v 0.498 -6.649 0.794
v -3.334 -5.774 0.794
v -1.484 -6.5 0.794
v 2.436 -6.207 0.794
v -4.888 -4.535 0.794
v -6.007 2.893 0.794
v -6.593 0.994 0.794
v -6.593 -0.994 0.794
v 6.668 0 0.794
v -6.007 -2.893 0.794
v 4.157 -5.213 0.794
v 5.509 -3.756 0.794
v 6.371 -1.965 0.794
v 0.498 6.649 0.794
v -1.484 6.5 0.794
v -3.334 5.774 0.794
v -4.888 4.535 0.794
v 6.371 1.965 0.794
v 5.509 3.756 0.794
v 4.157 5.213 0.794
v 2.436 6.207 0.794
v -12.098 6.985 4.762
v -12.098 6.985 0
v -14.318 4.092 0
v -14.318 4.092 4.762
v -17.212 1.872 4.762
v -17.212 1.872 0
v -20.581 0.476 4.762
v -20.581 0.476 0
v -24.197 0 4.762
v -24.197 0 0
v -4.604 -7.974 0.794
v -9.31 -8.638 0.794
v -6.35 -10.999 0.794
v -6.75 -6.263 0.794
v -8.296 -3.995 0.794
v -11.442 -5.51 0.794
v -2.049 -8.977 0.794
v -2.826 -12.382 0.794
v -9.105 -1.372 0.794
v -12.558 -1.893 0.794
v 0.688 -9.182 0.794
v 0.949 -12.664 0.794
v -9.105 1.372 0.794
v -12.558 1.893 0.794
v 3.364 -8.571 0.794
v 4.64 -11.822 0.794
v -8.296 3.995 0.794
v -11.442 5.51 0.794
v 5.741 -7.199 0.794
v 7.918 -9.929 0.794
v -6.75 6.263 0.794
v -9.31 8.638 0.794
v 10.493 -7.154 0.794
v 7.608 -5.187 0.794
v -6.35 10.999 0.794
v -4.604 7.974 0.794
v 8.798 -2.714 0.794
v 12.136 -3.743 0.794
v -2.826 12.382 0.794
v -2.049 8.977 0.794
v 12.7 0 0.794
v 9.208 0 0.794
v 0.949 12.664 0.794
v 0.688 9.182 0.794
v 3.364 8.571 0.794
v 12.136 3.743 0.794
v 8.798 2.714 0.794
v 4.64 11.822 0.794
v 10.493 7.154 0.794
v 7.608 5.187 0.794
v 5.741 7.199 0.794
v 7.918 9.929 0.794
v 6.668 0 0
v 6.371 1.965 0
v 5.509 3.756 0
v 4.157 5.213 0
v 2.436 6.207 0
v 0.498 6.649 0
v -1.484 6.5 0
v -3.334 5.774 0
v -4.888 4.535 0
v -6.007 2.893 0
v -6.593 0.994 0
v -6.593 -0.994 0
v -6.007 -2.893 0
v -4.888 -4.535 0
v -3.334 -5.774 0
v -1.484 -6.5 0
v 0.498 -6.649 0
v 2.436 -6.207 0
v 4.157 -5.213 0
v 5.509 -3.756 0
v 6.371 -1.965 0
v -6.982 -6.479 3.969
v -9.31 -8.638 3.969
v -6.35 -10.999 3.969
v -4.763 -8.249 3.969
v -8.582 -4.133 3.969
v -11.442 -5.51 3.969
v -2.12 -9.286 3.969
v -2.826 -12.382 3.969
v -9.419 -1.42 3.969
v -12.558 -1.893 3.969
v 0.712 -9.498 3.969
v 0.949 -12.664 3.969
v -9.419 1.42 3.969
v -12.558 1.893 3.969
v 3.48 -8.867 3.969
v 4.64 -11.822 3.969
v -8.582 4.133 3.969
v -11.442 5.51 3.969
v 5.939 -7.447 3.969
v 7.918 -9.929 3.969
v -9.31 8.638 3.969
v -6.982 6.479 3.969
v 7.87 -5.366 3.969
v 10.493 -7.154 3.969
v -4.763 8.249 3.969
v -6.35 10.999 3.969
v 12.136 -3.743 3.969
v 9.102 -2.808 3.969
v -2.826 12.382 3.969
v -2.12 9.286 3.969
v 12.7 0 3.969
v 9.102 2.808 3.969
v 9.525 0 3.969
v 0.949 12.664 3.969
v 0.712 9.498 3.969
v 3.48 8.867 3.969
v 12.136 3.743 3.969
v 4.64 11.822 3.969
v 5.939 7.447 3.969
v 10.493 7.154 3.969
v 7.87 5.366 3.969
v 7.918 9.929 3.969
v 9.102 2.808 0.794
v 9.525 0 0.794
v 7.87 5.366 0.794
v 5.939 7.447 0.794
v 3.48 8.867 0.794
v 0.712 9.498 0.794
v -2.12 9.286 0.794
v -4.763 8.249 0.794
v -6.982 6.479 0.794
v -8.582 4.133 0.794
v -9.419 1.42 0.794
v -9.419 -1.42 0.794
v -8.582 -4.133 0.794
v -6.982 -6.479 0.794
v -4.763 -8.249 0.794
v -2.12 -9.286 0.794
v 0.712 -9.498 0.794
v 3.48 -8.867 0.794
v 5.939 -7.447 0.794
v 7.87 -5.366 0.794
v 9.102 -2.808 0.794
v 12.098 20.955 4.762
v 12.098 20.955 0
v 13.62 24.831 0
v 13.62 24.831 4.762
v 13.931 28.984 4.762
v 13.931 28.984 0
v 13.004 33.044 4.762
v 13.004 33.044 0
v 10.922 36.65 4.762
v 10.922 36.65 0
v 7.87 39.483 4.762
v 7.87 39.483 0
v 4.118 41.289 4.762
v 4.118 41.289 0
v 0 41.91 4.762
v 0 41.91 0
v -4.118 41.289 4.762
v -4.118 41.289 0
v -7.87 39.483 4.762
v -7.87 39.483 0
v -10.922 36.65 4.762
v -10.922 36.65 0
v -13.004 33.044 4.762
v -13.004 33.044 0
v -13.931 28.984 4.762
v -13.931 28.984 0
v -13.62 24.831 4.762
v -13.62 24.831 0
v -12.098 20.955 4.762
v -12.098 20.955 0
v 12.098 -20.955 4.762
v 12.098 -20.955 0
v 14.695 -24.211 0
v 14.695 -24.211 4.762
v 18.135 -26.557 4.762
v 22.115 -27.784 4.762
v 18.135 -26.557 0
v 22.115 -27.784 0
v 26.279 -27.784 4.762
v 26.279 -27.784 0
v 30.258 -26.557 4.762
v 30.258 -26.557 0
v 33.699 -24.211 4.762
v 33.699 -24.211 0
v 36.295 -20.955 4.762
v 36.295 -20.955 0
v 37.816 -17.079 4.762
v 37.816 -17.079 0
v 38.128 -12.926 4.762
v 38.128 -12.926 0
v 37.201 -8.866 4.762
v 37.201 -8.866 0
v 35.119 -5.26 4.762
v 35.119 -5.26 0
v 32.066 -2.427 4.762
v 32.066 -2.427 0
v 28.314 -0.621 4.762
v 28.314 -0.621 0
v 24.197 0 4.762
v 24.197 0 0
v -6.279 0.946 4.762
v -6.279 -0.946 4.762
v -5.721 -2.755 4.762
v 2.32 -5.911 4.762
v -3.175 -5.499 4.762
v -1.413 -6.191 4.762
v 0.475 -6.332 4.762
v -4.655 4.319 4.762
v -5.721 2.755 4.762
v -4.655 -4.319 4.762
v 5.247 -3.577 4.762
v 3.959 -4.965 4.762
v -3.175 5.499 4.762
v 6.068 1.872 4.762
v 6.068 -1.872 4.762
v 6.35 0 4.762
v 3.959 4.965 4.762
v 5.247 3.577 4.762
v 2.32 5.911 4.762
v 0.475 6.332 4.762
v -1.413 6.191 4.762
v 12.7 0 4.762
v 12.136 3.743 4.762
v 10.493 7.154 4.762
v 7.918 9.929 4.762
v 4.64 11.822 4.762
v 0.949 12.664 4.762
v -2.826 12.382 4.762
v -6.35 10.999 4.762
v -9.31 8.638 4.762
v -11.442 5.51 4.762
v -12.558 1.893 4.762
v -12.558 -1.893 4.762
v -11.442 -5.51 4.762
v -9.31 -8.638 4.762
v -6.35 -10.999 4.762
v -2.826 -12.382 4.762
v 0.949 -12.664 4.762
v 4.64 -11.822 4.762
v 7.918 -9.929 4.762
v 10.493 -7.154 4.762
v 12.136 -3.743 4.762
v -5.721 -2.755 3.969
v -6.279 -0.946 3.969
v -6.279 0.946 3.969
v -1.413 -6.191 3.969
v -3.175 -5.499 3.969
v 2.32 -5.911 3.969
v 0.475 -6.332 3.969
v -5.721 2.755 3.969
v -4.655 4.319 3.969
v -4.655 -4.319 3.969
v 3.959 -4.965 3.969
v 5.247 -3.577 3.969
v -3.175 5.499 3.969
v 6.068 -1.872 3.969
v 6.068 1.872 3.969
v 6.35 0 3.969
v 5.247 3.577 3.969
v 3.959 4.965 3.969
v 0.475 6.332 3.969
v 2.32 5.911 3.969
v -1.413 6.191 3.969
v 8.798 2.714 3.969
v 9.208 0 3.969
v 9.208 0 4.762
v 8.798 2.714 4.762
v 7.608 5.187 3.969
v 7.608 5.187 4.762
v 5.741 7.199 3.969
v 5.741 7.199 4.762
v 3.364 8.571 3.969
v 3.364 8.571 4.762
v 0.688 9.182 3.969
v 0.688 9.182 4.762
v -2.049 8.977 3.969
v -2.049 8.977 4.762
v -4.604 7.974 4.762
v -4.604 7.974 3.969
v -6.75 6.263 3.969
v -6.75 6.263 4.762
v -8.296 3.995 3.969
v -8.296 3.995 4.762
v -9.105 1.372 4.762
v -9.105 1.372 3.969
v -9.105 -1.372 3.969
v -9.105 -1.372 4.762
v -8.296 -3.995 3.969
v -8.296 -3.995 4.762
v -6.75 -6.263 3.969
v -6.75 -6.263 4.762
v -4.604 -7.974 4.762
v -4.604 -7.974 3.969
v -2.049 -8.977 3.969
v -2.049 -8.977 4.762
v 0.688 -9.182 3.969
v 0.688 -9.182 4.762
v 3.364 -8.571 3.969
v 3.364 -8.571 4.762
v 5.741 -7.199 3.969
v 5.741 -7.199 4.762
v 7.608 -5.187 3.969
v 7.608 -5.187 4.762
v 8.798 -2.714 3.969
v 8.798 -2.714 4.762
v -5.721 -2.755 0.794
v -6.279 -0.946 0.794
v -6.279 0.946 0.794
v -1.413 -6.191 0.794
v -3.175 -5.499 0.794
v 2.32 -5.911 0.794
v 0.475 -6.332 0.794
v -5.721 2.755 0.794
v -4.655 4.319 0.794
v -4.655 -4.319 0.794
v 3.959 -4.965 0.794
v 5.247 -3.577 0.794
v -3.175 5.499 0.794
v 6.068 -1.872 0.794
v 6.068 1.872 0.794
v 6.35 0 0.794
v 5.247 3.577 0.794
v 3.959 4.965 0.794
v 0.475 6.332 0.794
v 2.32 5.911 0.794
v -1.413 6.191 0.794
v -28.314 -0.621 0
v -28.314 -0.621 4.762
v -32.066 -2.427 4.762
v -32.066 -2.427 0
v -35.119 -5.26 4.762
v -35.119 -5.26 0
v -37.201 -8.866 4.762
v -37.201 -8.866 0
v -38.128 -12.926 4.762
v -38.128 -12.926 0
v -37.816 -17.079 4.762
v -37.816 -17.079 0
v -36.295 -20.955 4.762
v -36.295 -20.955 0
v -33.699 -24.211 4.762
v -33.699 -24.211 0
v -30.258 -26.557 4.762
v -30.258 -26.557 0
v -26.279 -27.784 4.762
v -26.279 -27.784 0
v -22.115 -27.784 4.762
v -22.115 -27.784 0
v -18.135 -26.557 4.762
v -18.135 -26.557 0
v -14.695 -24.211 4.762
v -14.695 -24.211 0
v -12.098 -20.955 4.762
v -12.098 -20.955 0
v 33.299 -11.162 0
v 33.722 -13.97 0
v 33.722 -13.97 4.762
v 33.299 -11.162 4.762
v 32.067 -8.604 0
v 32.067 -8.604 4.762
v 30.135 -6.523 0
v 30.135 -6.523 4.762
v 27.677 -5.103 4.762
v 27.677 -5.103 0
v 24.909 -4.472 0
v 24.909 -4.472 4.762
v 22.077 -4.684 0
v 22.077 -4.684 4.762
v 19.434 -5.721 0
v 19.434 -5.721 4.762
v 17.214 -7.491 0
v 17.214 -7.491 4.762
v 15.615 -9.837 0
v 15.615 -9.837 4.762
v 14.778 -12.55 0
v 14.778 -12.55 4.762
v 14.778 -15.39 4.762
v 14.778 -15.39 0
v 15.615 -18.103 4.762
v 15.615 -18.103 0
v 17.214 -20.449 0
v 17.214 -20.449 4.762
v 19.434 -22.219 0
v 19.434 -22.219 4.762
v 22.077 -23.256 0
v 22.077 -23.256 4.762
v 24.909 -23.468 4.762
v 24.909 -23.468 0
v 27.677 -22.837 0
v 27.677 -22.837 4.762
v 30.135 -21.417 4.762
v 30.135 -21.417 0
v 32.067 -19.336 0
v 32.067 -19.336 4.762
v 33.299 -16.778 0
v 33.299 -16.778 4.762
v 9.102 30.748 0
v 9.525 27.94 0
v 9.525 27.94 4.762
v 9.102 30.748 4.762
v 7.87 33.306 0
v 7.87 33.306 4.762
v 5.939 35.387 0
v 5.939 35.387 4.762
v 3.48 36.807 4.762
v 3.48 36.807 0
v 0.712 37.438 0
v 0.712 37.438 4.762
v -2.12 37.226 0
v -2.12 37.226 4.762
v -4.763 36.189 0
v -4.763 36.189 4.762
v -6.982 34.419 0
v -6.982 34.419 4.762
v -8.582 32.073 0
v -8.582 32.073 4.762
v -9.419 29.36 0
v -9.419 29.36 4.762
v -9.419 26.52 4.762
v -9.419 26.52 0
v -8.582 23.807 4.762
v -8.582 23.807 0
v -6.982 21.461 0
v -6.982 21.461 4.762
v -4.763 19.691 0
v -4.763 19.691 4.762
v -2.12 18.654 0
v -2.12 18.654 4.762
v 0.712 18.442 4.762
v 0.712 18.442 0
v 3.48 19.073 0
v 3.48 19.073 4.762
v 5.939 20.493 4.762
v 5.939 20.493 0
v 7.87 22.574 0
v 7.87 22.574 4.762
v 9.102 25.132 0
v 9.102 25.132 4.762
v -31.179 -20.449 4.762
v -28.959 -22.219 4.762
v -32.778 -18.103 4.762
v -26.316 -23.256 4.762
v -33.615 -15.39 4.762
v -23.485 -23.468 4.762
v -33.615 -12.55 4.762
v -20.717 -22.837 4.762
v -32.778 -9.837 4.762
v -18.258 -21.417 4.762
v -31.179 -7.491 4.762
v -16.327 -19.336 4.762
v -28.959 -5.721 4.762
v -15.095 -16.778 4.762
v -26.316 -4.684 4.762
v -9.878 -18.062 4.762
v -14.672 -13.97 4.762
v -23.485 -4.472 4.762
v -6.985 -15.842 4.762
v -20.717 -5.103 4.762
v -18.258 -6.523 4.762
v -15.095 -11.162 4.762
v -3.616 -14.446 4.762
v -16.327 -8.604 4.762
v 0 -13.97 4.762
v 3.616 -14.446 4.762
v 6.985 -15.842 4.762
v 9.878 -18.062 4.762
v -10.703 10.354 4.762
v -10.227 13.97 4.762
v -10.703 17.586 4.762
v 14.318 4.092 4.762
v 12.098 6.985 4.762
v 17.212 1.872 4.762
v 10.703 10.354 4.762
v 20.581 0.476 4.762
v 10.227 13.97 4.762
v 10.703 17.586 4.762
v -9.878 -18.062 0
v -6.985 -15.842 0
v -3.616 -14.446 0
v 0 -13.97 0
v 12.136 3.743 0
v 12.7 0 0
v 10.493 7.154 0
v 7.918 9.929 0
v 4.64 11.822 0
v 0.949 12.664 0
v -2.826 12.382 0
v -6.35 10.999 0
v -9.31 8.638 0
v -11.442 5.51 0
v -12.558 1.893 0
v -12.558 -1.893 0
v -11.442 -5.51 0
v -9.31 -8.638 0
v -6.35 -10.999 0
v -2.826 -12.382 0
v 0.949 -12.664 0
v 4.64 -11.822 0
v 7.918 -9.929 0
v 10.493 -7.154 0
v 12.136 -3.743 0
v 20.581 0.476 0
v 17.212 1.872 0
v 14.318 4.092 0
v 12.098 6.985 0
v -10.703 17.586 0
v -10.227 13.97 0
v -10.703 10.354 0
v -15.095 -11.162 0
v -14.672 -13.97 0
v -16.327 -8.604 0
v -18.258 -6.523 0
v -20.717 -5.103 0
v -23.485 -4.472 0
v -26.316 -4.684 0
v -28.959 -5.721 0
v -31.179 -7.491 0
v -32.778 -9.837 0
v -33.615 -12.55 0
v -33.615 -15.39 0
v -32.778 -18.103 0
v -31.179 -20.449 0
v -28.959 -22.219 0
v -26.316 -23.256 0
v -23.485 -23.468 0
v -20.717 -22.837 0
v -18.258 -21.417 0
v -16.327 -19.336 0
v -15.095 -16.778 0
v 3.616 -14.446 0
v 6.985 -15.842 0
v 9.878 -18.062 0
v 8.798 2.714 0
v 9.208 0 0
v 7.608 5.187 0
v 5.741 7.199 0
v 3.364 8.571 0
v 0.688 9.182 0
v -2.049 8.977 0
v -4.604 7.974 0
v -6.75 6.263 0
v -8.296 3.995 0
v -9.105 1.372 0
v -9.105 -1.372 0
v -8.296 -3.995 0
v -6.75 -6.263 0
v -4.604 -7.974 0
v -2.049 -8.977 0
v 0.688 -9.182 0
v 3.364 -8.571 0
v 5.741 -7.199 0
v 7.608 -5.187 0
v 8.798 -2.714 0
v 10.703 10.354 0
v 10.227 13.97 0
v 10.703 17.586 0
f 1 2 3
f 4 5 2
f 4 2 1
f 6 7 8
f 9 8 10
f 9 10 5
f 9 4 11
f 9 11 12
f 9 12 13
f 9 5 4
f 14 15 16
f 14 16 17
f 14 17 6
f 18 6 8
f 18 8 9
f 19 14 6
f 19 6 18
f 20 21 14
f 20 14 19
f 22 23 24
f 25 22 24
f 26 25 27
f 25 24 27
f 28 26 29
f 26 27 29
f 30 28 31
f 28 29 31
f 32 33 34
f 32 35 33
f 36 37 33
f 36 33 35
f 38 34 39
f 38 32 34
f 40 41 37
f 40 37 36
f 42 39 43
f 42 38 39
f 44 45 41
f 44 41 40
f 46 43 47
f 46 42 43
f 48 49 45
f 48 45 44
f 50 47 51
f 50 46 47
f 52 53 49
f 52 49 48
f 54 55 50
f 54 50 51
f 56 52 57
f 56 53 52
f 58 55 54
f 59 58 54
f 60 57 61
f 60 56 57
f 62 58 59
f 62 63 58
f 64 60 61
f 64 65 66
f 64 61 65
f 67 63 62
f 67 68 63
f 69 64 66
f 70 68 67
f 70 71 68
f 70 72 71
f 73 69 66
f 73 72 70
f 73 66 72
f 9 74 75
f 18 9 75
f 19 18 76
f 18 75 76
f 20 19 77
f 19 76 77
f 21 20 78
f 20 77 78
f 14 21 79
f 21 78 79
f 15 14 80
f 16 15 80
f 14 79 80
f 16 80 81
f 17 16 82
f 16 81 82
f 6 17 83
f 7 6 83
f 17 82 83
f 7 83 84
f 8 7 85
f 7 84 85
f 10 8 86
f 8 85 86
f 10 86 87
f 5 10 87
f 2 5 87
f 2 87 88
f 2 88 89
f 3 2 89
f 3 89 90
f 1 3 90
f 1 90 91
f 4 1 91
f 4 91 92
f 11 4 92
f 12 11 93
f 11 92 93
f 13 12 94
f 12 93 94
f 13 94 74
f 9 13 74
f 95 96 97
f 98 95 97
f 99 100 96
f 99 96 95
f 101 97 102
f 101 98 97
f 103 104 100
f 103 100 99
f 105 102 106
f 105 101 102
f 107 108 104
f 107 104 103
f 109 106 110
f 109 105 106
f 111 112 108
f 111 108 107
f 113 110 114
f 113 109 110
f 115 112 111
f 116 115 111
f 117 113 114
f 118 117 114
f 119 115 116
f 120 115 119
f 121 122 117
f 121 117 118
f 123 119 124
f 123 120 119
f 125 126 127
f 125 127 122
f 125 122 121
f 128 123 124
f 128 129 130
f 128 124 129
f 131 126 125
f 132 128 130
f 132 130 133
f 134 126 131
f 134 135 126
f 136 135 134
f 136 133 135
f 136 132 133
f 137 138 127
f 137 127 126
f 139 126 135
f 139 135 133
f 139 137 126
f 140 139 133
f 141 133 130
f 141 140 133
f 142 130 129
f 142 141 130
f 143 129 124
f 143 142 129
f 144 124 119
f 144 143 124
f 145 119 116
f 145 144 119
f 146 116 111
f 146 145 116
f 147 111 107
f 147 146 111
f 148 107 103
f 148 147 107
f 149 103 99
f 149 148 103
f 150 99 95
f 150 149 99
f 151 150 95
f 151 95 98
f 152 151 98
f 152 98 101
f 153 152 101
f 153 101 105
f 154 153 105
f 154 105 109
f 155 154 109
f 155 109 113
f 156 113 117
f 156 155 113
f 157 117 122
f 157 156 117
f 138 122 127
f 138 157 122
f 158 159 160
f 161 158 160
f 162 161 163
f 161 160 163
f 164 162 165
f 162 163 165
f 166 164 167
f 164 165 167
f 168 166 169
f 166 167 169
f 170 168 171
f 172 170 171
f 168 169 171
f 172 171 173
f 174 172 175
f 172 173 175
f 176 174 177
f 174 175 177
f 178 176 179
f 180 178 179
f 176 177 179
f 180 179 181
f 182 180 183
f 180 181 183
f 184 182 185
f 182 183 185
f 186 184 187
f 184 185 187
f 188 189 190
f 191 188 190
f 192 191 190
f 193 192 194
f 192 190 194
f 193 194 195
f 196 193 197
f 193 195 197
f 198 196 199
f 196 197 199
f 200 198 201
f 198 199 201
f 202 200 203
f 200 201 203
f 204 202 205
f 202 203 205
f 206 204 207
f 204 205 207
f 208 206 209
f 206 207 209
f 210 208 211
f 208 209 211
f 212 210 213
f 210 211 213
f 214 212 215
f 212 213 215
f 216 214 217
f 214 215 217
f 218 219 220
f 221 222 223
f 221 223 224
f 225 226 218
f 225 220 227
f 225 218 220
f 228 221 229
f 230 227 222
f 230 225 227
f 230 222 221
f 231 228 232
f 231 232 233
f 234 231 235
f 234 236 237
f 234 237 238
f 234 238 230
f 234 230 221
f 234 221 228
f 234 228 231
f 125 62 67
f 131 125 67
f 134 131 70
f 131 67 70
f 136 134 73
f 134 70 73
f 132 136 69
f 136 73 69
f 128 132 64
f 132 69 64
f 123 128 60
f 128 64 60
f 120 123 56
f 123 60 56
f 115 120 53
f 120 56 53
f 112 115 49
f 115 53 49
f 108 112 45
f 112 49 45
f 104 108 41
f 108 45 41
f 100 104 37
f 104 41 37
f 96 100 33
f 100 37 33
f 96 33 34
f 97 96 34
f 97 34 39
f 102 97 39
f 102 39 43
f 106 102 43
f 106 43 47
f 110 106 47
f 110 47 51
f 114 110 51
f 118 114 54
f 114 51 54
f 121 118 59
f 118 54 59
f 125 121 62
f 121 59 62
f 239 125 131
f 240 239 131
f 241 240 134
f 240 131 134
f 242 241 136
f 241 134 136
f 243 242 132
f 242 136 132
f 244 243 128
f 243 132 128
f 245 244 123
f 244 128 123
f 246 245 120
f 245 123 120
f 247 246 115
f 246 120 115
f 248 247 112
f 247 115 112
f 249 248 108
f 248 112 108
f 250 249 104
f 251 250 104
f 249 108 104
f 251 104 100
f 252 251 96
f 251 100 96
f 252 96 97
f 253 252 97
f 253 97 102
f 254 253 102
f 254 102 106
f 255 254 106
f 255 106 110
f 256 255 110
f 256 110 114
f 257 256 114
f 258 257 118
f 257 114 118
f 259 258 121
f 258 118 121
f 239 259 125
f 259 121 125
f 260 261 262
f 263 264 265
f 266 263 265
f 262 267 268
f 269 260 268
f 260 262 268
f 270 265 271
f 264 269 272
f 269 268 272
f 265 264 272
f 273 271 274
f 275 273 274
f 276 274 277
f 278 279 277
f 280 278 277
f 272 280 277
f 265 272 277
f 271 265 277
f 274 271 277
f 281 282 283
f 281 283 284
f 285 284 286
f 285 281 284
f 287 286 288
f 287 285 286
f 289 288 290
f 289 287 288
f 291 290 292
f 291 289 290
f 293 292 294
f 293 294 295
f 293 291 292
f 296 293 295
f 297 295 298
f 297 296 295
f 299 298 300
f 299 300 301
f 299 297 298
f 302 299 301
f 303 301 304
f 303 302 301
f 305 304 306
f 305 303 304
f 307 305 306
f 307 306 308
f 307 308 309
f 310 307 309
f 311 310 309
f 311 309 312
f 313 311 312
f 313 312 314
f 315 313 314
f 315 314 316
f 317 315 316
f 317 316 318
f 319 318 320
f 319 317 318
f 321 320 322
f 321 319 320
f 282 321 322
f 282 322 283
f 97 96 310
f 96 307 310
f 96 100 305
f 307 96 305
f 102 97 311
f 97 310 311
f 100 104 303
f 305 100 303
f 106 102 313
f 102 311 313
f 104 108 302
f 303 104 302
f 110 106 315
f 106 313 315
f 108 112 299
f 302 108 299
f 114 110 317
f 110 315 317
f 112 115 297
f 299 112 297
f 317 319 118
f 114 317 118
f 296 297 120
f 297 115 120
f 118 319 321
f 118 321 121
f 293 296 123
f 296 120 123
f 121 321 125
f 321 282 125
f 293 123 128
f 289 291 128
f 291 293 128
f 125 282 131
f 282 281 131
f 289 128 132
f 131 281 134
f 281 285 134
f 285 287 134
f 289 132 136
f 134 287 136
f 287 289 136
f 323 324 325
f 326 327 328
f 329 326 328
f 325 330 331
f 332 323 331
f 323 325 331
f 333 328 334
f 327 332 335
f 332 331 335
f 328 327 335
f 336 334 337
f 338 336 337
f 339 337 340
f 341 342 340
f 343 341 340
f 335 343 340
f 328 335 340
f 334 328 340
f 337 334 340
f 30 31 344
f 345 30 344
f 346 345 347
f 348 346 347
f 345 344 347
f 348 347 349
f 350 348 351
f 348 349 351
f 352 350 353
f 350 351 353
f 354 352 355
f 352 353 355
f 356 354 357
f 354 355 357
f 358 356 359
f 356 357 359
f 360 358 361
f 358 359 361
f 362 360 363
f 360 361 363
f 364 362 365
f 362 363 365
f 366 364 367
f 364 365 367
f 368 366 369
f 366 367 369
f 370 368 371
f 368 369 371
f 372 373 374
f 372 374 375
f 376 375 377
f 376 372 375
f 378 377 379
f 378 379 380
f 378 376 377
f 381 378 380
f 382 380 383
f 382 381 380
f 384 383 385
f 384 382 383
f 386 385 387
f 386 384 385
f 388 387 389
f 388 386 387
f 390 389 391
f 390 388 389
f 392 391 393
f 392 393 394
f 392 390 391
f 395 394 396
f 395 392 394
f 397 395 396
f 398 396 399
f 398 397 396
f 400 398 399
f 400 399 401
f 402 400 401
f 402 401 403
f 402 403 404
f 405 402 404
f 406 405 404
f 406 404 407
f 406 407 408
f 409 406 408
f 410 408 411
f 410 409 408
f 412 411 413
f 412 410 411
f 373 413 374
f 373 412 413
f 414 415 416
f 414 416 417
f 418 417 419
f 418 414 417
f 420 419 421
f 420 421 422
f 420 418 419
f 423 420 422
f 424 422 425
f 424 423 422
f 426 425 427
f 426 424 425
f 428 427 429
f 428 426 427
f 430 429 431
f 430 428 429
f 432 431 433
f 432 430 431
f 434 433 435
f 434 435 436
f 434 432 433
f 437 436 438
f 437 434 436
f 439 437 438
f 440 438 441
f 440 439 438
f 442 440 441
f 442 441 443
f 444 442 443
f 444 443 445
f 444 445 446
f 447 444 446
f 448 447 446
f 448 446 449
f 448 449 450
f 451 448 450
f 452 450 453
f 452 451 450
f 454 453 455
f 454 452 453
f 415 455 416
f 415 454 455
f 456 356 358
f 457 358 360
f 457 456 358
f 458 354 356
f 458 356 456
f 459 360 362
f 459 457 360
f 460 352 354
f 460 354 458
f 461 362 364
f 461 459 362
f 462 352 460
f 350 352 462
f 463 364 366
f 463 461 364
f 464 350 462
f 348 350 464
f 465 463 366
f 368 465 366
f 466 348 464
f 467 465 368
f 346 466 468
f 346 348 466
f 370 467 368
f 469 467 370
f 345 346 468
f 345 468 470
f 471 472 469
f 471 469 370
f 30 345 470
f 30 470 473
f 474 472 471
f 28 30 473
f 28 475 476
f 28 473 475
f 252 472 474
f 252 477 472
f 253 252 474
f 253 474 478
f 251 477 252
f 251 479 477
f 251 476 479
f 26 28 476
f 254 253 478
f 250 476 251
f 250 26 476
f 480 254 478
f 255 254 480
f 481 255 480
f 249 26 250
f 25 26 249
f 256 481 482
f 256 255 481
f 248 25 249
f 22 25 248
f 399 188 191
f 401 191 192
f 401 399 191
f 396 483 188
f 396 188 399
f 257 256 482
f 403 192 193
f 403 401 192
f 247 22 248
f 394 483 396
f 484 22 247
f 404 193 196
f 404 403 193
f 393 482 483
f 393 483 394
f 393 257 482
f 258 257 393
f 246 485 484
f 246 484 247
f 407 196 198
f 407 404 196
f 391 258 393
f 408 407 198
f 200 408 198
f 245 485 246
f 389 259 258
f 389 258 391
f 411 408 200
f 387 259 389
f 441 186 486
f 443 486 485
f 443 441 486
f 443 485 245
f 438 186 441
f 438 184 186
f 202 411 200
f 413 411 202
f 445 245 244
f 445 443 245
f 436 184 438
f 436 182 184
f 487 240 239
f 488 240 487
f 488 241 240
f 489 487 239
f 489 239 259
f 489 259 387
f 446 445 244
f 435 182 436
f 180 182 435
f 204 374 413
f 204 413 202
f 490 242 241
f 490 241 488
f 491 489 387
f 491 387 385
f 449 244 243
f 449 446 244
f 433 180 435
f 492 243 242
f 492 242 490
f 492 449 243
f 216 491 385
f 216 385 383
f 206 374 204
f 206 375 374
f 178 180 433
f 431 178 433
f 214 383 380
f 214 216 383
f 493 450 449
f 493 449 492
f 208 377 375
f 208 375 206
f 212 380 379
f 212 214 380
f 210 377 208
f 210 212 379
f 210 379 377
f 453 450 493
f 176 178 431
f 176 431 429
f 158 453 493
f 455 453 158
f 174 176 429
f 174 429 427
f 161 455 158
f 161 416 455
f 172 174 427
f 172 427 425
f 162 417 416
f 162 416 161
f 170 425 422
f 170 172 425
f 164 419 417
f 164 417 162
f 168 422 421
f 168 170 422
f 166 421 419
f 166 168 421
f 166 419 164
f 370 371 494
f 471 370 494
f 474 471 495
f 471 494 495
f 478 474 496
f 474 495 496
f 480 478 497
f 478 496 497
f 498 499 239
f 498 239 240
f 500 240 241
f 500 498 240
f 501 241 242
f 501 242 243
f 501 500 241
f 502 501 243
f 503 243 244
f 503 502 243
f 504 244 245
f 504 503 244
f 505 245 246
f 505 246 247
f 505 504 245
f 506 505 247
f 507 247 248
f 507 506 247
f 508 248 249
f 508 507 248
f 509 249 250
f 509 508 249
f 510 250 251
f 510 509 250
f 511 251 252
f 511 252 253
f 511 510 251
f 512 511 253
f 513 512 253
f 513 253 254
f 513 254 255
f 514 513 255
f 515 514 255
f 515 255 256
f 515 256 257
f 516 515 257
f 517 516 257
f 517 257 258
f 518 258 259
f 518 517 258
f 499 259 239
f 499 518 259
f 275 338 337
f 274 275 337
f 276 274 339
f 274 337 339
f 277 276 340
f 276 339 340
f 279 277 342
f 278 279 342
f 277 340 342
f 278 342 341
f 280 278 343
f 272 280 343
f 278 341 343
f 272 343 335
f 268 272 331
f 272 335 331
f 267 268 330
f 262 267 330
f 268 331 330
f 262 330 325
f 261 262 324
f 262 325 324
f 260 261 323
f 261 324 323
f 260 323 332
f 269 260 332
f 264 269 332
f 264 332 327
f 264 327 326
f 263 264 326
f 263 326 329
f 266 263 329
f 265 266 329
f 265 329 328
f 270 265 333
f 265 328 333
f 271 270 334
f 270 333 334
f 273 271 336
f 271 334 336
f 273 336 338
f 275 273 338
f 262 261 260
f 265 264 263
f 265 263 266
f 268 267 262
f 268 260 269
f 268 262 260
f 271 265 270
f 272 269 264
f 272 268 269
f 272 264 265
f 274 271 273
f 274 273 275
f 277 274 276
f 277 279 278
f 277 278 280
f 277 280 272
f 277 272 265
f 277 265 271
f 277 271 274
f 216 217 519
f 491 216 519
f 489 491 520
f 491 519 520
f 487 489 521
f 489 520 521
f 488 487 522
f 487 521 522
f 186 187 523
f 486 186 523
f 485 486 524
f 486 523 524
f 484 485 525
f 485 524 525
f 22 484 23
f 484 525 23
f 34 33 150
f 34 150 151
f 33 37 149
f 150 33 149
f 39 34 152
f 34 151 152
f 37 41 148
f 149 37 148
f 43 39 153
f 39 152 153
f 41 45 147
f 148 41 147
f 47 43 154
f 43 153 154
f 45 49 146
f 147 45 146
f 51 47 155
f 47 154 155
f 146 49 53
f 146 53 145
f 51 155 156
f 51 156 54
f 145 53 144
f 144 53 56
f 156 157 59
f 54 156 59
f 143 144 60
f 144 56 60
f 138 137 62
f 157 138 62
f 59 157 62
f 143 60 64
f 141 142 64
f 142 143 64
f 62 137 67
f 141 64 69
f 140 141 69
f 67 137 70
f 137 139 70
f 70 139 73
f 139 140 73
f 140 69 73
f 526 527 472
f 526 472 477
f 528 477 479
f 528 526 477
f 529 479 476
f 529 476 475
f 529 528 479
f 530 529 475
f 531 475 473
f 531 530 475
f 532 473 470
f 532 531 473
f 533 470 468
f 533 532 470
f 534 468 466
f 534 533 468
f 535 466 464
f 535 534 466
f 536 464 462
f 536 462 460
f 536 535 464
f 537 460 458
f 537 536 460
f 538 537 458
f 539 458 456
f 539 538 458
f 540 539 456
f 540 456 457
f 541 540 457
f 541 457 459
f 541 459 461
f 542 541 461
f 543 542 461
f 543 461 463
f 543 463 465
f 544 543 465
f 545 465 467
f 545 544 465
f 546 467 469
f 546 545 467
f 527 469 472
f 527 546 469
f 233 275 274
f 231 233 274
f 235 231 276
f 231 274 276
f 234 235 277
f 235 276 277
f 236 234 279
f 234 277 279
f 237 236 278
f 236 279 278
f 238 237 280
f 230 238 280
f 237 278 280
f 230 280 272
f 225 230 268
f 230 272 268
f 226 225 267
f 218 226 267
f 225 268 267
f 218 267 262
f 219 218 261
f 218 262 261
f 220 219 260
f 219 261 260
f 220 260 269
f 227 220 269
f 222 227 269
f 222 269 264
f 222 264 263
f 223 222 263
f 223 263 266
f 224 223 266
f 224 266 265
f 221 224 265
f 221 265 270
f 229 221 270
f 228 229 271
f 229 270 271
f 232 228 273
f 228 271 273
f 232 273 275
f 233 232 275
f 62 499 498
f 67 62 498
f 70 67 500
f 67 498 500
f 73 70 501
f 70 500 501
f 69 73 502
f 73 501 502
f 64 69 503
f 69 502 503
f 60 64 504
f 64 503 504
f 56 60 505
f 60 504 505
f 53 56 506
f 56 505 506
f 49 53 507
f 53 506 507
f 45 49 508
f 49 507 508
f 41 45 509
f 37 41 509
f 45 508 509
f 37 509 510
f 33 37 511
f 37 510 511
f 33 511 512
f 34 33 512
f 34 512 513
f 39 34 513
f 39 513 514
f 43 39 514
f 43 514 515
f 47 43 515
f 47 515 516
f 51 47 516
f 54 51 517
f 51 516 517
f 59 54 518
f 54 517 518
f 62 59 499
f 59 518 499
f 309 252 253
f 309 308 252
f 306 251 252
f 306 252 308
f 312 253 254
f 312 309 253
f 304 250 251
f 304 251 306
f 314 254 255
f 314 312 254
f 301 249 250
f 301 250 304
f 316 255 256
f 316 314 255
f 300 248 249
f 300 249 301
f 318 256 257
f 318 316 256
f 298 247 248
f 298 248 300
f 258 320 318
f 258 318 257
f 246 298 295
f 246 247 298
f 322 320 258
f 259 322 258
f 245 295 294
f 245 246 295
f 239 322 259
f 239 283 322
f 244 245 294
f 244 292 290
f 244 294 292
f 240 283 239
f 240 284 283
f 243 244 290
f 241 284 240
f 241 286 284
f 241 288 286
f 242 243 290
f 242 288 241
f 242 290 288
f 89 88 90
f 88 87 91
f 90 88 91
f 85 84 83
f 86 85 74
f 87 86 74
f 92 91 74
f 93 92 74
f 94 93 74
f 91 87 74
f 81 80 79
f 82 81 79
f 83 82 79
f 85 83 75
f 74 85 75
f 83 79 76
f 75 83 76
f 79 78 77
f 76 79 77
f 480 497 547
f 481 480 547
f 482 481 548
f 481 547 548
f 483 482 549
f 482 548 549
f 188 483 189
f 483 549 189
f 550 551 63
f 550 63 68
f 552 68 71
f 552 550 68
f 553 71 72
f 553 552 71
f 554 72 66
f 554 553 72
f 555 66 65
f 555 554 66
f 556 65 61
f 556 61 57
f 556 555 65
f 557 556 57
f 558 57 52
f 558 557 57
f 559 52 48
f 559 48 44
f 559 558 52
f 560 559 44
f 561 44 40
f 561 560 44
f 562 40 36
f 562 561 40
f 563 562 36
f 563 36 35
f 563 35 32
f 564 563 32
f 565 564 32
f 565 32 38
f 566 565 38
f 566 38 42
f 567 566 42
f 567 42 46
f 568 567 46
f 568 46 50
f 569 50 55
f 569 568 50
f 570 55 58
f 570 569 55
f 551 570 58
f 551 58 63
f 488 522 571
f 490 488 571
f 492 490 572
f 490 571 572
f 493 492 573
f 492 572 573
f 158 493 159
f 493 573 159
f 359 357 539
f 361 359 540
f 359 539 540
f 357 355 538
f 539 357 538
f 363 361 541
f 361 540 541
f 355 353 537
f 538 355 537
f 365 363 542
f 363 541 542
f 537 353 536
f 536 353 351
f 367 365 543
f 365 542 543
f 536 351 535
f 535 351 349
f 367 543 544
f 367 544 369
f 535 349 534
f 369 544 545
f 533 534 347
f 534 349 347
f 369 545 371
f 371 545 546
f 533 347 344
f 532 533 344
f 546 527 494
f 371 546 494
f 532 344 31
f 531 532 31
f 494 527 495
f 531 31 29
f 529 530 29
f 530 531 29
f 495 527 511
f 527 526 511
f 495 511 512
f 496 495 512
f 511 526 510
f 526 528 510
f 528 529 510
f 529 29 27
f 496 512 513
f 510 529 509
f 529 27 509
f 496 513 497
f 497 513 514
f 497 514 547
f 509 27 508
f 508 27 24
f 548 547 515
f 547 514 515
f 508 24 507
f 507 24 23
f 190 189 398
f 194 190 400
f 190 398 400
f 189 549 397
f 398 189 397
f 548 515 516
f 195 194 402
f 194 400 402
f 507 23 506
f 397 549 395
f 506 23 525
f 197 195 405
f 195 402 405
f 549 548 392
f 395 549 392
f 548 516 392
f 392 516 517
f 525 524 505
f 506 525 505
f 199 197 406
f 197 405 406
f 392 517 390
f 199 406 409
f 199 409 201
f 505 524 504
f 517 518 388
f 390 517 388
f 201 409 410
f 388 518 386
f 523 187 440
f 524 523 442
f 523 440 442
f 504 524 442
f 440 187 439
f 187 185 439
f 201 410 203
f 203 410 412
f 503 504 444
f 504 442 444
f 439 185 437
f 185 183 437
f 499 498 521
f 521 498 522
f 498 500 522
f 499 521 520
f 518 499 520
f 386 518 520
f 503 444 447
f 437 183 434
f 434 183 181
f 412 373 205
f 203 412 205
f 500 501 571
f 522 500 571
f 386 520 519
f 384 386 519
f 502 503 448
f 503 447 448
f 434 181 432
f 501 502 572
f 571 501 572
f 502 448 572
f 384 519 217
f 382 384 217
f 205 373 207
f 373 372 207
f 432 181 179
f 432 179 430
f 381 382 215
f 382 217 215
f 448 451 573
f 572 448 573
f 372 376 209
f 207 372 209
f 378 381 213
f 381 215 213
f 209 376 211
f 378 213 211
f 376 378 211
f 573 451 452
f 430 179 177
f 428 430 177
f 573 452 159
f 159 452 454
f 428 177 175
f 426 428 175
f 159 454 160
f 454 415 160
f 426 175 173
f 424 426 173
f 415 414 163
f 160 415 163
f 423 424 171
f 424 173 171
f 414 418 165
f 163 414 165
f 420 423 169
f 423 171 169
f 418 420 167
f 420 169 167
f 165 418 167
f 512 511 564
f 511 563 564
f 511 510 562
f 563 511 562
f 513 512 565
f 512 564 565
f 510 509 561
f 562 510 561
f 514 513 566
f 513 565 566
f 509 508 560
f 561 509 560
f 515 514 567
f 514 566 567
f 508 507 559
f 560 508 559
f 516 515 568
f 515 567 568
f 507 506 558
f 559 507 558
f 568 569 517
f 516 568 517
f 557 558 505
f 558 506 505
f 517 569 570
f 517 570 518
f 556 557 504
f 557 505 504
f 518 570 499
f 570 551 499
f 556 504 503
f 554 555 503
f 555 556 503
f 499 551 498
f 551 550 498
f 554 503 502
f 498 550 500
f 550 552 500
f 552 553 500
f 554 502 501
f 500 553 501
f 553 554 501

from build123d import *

# Parameters (mm, degrees)
F0_R     = 12.7
F0_R_2   = 9.2075
F1_DEPTH = 0.79375
F0_R_3   = 6.6675
F2_R     = 6.35
F3_DEPTH = 3.175
F2_R_2   = 12.7
F2_R_3   = 9.525
F4_R     = 6.35
F5_DEPTH = 0.79375
F4_R_2   = 12.7
F4_R_3   = 9.2075
F6_R     = 9.525
F6_R_2   = 12.7
F7_DEPTH = 4.7625


with BuildPart() as f1:
    # F0 (on Top) → F1 (new body)
    with BuildSketch(Plane.XY):
        Circle(F0_R)
        Circle(F0_R_2, mode=Mode.SUBTRACT)
    extrude(amount=F1_DEPTH)


with BuildPart() as f1b:
    # F0 (on Top) → F1, piece 2 (new body)
    with BuildSketch(Plane.XY):
        Circle(F0_R_3)
    extrude(amount=F1_DEPTH)


with BuildPart() as f3:
    # F2 (on face) → F3 (new body)
    with BuildSketch(Plane.XY.offset(0.79375)):
        Circle(F2_R)
    extrude(amount=F3_DEPTH)


with BuildPart() as f3b:
    # F2 (on face) → F3, piece 2 (new body)
    with BuildSketch(Plane.XY.offset(0.79375)):
        Circle(F2_R_2)
        Circle(F2_R_3, mode=Mode.SUBTRACT)
    extrude(amount=F3_DEPTH)


with BuildPart() as f5:
    # F4 (on face) → F5 (new body)
    with BuildSketch(Plane.XY.offset(3.96875)):
        Circle(F4_R)
    extrude(amount=F5_DEPTH)


with BuildPart() as f5b:
    # F4 (on face) → F5, piece 2 (new body)
    with BuildSketch(Plane.XY.offset(3.96875)):
        Circle(F4_R_2)
        Circle(F4_R_3, mode=Mode.SUBTRACT)
    extrude(amount=F5_DEPTH)


with BuildPart() as f7:
    # F6 (on Top) → F7 (new body)
    with BuildSketch(Plane.XY):
        with BuildLine():
            ThreePointArc((-12.0983754113, 6.9849990986), (1.12e-08, 13.97), (12.0983754224, 6.9849990793))
            ThreePointArc((12.0983754224, 6.9849990793), (10.2267497817, 13.9699994684), (12.0983748909, 20.955))
            ThreePointArc((12.0983748909, 20.955), (0, 41.91), (-12.0983748909, 20.955))
            ThreePointArc((-12.0983748909, 20.955), (-10.2267497817, 13.9699994796), (-12.0983754113, 6.9849990986))
        make_face()
        with Locations((0, 27.94)):
            Circle(F6_R, mode=Mode.SUBTRACT)
        with BuildLine():
            ThreePointArc((-12.0983748909, -20.955), (-6.9849999981, -15.841625108), (4.5e-09, -13.97))
            ThreePointArc((4.5e-09, -13.97), (-12.0983746295, -6.9850004526), (-12.0983754113, 6.9849990986))
            ThreePointArc((-12.0983754113, 6.9849990986), (-17.2117502324, 1.8716248489), (-24.1967497817, 0))
            ThreePointArc((-24.1967497817, 0), (-36.2951246726, -20.955), (-12.0983748909, -20.955))
        make_face()
        with Locations((-24.1967497817, -13.97)):
            Circle(F6_R, mode=Mode.SUBTRACT)
        with BuildLine():
            ThreePointArc((12.0983754224, 6.9849990793), (13.4939839308, 3.6157015466), (13.97, 0))
            ThreePointArc((13.97, 0), (9.8782817348, -9.8782817316), (4.5e-09, -13.97))
            ThreePointArc((4.5e-09, -13.97), (6.9850000019, -15.8416251103), (12.0983748909, -20.955))
            ThreePointArc((12.0983748909, -20.955), (36.2951246726, -20.955), (24.1967497817, 0))
            ThreePointArc((24.1967497817, 0), (17.2117502421, 1.8716248433), (12.0983754224, 6.9849990793))
        make_face()
        with Locations((24.1967497817, -13.97)):
            Circle(F6_R, mode=Mode.SUBTRACT)
        with BuildLine():
            ThreePointArc((4.5e-09, -13.97), (9.8782817348, -9.8782817316), (13.97, 0))
            ThreePointArc((13.97, 0), (13.4939839308, 3.6157015466), (12.0983754224, 6.9849990793))
            ThreePointArc((12.0983754224, 6.9849990793), (1.12e-08, 13.97), (-12.0983754113, 6.9849990986))
            ThreePointArc((-12.0983754113, 6.9849990986), (-12.0983746295, -6.9850004526), (4.5e-09, -13.97))
        make_face()
        Circle(F6_R_2, mode=Mode.SUBTRACT)
    extrude(amount=F7_DEPTH)


solid = Compound([f1.part, f1b.part, f3.part, f3b.part, f5.part, f5b.part, f7.part])
